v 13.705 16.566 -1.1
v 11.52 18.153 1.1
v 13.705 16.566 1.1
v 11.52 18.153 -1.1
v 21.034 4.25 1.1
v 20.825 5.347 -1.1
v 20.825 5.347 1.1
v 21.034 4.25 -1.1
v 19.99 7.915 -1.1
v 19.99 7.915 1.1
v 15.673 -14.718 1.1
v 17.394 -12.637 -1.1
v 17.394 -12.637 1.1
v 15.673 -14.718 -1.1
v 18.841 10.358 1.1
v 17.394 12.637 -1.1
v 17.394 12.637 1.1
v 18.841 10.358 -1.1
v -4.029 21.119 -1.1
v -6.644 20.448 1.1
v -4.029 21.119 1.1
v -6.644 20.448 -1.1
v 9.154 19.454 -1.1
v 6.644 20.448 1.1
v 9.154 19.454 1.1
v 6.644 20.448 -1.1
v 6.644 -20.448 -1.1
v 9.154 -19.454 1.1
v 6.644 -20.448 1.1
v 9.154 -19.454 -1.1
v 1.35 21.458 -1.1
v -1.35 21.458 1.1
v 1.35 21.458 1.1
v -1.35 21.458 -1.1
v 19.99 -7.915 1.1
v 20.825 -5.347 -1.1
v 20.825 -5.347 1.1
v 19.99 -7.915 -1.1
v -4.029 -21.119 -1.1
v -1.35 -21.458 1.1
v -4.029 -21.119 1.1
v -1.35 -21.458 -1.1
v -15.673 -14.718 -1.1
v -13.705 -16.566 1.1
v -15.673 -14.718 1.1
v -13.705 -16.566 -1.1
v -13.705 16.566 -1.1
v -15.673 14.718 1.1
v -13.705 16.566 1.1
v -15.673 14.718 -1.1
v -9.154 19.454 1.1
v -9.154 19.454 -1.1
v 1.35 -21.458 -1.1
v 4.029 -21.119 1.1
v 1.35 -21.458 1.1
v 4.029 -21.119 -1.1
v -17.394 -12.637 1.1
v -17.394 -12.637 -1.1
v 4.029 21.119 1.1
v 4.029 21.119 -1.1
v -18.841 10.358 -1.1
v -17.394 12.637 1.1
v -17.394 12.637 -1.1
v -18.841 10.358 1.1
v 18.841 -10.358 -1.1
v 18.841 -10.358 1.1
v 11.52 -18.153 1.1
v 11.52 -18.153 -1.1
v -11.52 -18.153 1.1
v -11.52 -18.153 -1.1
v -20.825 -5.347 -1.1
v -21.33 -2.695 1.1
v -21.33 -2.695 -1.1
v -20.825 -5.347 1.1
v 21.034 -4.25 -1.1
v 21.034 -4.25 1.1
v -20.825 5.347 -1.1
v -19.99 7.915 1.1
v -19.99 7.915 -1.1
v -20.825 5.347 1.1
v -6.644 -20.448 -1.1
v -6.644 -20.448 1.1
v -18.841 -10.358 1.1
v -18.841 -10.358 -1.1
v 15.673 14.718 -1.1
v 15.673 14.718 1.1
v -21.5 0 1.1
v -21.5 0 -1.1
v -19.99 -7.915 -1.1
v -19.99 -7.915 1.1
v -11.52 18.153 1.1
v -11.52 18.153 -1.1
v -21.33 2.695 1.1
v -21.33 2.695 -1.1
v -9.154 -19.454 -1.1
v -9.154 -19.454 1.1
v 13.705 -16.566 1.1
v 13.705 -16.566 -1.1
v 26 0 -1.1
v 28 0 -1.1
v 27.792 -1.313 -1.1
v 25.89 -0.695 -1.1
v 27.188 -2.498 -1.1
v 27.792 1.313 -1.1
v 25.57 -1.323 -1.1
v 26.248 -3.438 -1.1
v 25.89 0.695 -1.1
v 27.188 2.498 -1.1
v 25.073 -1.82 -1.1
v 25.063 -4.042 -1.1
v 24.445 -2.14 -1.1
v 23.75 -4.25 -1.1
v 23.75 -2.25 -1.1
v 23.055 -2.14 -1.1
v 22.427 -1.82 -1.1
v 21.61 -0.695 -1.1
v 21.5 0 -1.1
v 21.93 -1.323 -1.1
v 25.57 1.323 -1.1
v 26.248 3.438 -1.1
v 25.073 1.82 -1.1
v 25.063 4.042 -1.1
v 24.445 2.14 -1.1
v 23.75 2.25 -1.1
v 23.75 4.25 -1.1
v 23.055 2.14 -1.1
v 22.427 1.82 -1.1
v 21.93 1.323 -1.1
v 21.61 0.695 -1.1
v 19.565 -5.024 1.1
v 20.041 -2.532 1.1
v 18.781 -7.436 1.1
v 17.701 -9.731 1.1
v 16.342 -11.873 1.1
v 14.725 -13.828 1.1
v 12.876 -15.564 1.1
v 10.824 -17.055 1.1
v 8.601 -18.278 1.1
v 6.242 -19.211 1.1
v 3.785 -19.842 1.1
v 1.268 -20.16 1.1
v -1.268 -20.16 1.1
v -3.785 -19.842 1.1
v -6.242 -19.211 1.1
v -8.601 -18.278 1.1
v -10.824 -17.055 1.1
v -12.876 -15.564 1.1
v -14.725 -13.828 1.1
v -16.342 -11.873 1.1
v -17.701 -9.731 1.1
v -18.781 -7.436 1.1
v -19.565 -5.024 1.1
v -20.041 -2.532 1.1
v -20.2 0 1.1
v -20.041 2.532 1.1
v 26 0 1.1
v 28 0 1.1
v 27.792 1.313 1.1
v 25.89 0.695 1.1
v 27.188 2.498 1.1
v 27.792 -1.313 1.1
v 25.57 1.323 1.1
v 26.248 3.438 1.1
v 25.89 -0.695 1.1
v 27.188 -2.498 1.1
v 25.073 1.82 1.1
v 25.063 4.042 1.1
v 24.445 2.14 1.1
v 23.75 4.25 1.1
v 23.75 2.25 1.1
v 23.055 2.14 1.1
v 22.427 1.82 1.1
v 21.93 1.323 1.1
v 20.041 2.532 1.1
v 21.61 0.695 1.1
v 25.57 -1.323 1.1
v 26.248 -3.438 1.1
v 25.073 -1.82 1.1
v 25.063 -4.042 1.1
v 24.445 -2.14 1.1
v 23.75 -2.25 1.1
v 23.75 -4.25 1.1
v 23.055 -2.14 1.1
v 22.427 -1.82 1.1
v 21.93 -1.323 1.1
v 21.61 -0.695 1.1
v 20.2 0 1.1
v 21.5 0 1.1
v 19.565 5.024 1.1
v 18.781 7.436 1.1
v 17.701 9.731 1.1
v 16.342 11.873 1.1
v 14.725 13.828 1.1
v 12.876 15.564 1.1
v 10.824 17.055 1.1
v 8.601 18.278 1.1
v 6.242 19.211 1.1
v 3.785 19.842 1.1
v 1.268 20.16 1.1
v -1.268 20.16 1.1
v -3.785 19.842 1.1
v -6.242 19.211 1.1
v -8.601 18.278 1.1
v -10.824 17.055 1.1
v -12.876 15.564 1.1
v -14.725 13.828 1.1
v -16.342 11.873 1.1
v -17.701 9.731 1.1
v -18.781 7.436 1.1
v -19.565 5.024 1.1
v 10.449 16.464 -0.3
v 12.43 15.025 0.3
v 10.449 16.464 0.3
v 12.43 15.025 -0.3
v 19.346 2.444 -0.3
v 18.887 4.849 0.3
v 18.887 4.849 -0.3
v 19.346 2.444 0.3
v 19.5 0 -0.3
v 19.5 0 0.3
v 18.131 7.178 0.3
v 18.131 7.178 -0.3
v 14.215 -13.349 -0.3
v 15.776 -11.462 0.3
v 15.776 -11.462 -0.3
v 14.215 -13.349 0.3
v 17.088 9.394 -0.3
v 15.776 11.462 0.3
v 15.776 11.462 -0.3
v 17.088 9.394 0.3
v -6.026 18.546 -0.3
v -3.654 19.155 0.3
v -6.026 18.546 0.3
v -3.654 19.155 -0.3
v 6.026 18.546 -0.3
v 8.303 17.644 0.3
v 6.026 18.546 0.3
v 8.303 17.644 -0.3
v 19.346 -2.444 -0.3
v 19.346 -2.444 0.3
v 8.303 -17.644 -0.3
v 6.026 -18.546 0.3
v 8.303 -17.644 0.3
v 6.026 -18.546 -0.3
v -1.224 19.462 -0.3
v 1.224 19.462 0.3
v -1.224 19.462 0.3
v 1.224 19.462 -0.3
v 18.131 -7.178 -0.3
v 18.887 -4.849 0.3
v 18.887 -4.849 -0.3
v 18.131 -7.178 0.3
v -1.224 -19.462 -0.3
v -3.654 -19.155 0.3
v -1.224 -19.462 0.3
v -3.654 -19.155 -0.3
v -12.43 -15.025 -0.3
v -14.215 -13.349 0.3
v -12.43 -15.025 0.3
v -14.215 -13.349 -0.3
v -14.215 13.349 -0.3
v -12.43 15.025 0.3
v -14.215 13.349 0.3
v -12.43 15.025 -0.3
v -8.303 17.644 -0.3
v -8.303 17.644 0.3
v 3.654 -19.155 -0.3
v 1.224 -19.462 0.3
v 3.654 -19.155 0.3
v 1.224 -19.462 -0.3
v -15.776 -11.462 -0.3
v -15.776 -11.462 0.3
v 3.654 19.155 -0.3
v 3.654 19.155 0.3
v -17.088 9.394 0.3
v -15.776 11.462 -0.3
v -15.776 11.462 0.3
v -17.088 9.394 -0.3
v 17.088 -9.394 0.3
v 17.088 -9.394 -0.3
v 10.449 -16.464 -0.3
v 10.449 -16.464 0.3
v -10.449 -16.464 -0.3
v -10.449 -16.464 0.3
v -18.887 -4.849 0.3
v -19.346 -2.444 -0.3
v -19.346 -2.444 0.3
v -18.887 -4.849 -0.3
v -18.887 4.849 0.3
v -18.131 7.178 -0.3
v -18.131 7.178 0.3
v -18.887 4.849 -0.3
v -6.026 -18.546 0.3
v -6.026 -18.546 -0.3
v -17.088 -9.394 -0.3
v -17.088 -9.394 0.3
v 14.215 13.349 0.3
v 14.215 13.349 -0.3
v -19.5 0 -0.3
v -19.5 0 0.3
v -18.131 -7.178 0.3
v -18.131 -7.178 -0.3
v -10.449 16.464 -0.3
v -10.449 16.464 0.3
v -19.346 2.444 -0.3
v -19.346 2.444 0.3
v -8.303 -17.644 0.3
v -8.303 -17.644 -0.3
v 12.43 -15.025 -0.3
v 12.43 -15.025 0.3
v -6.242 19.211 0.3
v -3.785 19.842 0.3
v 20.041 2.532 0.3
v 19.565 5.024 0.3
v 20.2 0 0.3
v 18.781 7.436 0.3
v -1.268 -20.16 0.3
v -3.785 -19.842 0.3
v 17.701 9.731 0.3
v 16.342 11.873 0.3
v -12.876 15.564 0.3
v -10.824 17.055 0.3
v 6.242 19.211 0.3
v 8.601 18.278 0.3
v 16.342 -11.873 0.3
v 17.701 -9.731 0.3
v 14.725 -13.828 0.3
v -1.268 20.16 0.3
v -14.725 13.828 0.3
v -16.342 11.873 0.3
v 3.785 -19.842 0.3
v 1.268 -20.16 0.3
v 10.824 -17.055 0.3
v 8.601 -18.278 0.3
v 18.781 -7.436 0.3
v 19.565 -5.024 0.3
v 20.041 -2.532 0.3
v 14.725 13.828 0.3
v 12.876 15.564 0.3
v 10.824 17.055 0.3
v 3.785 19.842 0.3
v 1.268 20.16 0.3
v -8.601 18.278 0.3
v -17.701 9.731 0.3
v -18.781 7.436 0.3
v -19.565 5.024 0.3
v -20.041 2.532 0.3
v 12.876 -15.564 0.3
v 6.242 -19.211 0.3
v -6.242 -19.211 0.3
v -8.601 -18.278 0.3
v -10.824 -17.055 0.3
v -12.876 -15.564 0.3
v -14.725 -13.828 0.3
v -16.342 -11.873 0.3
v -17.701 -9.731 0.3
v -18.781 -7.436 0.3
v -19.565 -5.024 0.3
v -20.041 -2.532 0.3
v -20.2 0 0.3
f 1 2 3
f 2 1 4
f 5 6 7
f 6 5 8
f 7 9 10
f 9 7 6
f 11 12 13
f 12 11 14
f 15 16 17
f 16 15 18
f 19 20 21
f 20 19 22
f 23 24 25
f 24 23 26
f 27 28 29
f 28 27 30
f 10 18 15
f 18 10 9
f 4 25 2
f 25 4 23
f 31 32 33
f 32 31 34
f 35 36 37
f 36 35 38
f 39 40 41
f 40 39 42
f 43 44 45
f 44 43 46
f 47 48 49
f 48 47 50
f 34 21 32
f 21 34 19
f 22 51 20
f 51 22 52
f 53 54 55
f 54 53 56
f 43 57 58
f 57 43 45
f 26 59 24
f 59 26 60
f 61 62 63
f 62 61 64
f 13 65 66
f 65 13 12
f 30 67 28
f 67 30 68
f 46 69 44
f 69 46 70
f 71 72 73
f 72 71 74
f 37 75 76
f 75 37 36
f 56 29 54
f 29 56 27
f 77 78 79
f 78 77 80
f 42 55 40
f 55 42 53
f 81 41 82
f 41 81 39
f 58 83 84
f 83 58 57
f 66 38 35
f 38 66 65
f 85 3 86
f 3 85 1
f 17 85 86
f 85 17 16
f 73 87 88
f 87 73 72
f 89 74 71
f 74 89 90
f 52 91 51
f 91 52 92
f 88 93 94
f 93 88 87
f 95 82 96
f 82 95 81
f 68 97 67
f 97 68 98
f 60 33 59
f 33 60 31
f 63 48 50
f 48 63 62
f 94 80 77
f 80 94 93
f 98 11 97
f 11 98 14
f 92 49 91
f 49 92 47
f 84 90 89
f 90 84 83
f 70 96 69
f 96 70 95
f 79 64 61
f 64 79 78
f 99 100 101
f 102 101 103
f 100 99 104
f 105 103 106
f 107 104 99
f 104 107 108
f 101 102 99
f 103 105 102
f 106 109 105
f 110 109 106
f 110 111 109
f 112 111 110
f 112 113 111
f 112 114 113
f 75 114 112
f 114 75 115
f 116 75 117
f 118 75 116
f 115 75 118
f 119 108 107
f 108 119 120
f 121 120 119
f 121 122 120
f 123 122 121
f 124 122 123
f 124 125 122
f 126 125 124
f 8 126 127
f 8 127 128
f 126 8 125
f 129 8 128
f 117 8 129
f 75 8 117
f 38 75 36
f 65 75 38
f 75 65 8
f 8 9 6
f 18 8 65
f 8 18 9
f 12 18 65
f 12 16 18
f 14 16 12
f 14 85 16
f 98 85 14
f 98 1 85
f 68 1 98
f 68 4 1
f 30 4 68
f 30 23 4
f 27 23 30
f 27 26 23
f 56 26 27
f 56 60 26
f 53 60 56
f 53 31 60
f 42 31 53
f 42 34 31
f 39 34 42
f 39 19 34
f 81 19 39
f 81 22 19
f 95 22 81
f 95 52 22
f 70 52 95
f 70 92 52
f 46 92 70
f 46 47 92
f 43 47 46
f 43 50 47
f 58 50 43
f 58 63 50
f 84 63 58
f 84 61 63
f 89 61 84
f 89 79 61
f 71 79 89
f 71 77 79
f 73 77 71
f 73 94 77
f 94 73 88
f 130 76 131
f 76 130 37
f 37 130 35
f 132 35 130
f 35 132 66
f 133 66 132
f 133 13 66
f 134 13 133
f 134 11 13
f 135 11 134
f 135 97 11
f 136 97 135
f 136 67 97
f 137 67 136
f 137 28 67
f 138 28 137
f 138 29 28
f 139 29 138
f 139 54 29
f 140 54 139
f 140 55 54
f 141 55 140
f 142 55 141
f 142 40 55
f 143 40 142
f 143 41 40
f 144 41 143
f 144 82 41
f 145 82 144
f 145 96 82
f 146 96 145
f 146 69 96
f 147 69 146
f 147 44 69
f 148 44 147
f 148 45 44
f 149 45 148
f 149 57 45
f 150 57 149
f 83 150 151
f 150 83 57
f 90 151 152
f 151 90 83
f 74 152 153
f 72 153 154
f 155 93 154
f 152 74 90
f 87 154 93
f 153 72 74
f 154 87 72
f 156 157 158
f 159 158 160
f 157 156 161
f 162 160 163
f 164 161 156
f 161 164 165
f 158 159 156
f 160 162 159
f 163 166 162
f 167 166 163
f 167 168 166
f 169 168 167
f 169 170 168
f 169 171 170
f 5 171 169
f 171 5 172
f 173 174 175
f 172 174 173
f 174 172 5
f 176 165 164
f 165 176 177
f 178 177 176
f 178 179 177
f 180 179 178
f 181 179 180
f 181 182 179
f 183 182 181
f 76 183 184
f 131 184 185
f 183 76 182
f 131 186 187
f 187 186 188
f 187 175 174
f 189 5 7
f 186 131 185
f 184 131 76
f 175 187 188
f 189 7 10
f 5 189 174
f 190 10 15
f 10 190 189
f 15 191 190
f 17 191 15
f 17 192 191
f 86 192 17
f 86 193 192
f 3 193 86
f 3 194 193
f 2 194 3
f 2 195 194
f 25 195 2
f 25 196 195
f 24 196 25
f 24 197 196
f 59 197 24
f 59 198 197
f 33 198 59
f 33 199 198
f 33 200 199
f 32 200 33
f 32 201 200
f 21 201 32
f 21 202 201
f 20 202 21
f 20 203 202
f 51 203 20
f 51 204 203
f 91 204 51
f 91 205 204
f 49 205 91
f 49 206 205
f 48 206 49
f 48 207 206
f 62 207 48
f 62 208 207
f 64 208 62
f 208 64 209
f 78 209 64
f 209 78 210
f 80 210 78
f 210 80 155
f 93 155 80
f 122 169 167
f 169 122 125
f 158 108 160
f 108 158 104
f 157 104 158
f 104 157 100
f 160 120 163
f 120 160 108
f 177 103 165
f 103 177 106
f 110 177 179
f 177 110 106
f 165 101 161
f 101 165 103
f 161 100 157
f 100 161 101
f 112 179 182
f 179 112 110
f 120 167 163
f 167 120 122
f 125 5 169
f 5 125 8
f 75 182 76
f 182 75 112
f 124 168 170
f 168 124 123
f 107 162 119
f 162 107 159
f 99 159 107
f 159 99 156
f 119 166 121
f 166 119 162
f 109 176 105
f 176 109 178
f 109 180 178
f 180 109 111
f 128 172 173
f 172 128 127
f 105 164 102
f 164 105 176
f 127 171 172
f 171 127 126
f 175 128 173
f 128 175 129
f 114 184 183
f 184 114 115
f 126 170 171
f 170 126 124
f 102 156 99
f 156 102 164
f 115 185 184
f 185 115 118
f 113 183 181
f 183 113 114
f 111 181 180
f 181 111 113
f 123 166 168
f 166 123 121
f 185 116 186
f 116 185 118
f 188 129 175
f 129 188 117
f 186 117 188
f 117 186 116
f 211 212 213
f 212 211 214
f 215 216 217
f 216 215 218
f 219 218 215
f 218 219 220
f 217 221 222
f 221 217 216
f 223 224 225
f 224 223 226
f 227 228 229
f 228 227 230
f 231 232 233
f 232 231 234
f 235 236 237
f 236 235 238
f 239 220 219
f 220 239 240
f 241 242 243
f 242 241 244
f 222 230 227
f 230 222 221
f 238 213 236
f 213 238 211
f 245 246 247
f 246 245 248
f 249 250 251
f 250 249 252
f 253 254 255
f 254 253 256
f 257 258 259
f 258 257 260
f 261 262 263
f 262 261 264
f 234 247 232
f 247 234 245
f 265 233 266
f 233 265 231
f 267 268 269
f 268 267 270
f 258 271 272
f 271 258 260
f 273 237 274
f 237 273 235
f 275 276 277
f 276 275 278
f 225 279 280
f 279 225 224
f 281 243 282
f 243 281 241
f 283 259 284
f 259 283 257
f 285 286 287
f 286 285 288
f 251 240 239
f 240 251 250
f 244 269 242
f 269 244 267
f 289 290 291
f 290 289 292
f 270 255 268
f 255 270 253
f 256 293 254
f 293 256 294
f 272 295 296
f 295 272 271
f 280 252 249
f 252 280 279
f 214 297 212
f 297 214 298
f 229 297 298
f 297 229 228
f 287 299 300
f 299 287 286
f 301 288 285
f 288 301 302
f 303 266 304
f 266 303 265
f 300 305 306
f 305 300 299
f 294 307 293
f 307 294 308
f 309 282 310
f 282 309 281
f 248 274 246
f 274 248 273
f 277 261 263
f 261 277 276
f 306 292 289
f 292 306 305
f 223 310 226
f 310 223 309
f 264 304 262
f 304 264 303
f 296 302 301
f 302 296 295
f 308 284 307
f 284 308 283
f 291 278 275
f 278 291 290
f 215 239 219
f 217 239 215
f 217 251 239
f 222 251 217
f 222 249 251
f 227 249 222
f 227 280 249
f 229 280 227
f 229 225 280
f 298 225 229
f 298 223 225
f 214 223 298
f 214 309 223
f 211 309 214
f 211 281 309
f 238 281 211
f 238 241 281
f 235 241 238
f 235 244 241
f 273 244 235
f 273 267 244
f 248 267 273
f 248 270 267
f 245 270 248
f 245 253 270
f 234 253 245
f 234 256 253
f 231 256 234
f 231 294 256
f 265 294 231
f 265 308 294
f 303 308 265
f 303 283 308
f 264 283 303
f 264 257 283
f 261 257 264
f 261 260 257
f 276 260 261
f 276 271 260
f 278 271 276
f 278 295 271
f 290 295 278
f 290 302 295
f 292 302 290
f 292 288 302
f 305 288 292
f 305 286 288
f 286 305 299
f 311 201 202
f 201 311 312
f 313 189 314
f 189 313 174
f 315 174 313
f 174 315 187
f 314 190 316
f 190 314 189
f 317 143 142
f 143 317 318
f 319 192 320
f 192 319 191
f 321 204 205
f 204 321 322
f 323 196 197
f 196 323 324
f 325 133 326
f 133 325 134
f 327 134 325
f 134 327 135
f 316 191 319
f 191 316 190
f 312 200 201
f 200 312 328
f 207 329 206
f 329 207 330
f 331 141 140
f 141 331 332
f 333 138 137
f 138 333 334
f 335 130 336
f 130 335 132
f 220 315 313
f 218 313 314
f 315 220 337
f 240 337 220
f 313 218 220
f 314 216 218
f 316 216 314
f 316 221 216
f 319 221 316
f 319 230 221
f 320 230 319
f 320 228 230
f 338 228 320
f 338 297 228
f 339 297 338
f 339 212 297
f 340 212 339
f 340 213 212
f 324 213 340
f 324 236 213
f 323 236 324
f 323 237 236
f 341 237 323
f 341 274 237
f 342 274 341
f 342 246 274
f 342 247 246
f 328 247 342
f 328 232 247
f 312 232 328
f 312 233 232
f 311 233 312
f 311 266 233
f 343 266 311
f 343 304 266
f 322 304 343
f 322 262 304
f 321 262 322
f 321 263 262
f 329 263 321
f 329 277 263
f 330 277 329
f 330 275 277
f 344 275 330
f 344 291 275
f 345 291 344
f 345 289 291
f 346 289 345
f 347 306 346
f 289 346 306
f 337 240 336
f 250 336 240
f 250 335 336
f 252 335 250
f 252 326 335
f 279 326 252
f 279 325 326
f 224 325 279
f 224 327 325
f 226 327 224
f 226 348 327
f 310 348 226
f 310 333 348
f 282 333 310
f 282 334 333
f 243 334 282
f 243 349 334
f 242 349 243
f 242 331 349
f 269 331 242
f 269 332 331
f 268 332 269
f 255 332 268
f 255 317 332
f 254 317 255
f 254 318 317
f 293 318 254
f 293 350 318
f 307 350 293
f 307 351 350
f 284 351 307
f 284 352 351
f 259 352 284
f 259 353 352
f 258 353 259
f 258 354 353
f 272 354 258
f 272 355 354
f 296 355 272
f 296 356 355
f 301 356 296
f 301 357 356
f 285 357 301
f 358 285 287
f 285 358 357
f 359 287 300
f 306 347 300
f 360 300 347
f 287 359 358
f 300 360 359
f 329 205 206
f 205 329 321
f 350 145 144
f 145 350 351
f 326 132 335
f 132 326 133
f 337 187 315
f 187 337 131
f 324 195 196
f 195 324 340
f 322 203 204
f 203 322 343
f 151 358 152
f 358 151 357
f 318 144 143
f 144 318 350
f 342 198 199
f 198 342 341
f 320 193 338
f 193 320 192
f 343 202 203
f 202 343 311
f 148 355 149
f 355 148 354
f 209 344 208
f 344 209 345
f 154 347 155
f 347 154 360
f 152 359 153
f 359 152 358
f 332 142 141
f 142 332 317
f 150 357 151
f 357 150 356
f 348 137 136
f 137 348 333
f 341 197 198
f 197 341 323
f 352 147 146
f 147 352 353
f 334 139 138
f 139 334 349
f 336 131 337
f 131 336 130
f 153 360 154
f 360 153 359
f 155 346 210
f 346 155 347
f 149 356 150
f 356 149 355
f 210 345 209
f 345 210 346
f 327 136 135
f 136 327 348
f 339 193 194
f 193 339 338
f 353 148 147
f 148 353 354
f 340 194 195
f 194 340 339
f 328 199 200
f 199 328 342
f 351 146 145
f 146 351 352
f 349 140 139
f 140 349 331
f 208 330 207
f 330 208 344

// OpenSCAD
// Pasutx, 7.4.2013
// NFC keyfob
//
// Change these parameters:

CavityDiameter=39;
Part=0; // [0:Case, 1:Lid]
Shape=0;  // [0:Circle, 1:Square]

LidThickness=0.8;
CavityThickness=0.6;
BottomThickness=0.8;

SideWidth=2;
LidSupportWidth=0.7;

RingOutsideDiameter=8.5;
RingHoleDiameter=4.5;

Tolerance=0.15;

//Only relevant for square fobs
RoundingRadius=3; 

// Do NOT change these parameters:
OutsideRadius=CavityDiameter/2+SideWidth;
CavityRadius=CavityDiameter/2;
RingHoleRadius=RingHoleDiameter/2;
RingOutsideRadius=RingOutsideDiameter/2;
TotalThickness=LidThickness+CavityThickness+BottomThickness;
RingThickness=RingOutsideRadius-RingHoleRadius;


// Create a cube([X,Y,Z]) with rounded vertical edges (radius R)
module RoundedBox (X,Y,Z,R)
{
	intersection()
   {
	   minkowski()
		{
		 cube([X-2*R,Y-2*R,Z],center=true);
		 cylinder(r=R,h=Z,$fn=16,center=true);
		}
		cube([2*X,2*Y,Z],center=true);
	}
}

if (Shape==0)
{
	if (Part==0)
	{
		//Show Case
		difference()
		{
			union()
			{
				//main body
				cylinder(r=OutsideRadius,h=TotalThickness,center=true,$fn=50);
				//ring
				translate([OutsideRadius+RingOutsideRadius-SideWidth,0,0])
					cylinder(r=RingOutsideRadius,h=TotalThickness,center=true,$fn=20);
				//ring connection
				translate([OutsideRadius-SideWidth,0,0])
					cube(size=[2*RingOutsideRadius,2*RingOutsideRadius,TotalThickness],center=true);
			}
			//ring hole
			translate([OutsideRadius+RingOutsideRadius-SideWidth,0,0])
				cylinder(r=RingHoleRadius,h=2*TotalThickness,center=true,$fn=20);
			//nfc cavity
			translate([0,0,BottomThickness])
				cylinder(r=CavityRadius,h=TotalThickness,center=true,$fn=50);
			//lid cavity
			translate([0,0,BottomThickness+CavityThickness])
				cylinder(r=CavityRadius+LidSupportWidth,h=TotalThickness,center=true,$fn=50);
		}
	}
	else
	{
		//Show Lid
		cylinder(r=CavityRadius+LidSupportWidth-Tolerance, h=LidThickness);
	}
}
else
{
	if (Part==0)
	{
		//Show Case
		difference()
		{
			union()
			{
				//main body
				RoundedBox (2*OutsideRadius,2*OutsideRadius,TotalThickness,RoundingRadius);
				//ring
				translate([OutsideRadius+RingOutsideRadius-SideWidth,0,0])
					cylinder(r=RingOutsideRadius,h=TotalThickness,center=true,$fn=20);
				//ring connection
				translate([OutsideRadius-SideWidth,0,0])
					cube(size=[2*RingOutsideRadius,2*RingOutsideRadius,TotalThickness],center=true);
			}
			//ring hole
			translate([OutsideRadius+RingOutsideRadius-SideWidth,0,0])
				cylinder(r=RingHoleRadius,h=2*TotalThickness,center=true,$fn=20);
			//nfc cavity
			translate([0,0,BottomThickness])
				RoundedBox(2*CavityRadius,2*CavityRadius,TotalThickness,RoundingRadius);
			//lid cavity
			translate([0,0,BottomThickness+CavityThickness])
				RoundedBox(2*(CavityRadius+LidSupportWidth),2*(CavityRadius+LidSupportWidth),TotalThickness,RoundingRadius);
		}
	}
	else
	{
		//Show Lid
		RoundedBox(2*(CavityRadius+LidSupportWidth-Tolerance),2*(CavityRadius+LidSupportWidth-Tolerance),LidThickness,RoundingRadius);
	}
}
